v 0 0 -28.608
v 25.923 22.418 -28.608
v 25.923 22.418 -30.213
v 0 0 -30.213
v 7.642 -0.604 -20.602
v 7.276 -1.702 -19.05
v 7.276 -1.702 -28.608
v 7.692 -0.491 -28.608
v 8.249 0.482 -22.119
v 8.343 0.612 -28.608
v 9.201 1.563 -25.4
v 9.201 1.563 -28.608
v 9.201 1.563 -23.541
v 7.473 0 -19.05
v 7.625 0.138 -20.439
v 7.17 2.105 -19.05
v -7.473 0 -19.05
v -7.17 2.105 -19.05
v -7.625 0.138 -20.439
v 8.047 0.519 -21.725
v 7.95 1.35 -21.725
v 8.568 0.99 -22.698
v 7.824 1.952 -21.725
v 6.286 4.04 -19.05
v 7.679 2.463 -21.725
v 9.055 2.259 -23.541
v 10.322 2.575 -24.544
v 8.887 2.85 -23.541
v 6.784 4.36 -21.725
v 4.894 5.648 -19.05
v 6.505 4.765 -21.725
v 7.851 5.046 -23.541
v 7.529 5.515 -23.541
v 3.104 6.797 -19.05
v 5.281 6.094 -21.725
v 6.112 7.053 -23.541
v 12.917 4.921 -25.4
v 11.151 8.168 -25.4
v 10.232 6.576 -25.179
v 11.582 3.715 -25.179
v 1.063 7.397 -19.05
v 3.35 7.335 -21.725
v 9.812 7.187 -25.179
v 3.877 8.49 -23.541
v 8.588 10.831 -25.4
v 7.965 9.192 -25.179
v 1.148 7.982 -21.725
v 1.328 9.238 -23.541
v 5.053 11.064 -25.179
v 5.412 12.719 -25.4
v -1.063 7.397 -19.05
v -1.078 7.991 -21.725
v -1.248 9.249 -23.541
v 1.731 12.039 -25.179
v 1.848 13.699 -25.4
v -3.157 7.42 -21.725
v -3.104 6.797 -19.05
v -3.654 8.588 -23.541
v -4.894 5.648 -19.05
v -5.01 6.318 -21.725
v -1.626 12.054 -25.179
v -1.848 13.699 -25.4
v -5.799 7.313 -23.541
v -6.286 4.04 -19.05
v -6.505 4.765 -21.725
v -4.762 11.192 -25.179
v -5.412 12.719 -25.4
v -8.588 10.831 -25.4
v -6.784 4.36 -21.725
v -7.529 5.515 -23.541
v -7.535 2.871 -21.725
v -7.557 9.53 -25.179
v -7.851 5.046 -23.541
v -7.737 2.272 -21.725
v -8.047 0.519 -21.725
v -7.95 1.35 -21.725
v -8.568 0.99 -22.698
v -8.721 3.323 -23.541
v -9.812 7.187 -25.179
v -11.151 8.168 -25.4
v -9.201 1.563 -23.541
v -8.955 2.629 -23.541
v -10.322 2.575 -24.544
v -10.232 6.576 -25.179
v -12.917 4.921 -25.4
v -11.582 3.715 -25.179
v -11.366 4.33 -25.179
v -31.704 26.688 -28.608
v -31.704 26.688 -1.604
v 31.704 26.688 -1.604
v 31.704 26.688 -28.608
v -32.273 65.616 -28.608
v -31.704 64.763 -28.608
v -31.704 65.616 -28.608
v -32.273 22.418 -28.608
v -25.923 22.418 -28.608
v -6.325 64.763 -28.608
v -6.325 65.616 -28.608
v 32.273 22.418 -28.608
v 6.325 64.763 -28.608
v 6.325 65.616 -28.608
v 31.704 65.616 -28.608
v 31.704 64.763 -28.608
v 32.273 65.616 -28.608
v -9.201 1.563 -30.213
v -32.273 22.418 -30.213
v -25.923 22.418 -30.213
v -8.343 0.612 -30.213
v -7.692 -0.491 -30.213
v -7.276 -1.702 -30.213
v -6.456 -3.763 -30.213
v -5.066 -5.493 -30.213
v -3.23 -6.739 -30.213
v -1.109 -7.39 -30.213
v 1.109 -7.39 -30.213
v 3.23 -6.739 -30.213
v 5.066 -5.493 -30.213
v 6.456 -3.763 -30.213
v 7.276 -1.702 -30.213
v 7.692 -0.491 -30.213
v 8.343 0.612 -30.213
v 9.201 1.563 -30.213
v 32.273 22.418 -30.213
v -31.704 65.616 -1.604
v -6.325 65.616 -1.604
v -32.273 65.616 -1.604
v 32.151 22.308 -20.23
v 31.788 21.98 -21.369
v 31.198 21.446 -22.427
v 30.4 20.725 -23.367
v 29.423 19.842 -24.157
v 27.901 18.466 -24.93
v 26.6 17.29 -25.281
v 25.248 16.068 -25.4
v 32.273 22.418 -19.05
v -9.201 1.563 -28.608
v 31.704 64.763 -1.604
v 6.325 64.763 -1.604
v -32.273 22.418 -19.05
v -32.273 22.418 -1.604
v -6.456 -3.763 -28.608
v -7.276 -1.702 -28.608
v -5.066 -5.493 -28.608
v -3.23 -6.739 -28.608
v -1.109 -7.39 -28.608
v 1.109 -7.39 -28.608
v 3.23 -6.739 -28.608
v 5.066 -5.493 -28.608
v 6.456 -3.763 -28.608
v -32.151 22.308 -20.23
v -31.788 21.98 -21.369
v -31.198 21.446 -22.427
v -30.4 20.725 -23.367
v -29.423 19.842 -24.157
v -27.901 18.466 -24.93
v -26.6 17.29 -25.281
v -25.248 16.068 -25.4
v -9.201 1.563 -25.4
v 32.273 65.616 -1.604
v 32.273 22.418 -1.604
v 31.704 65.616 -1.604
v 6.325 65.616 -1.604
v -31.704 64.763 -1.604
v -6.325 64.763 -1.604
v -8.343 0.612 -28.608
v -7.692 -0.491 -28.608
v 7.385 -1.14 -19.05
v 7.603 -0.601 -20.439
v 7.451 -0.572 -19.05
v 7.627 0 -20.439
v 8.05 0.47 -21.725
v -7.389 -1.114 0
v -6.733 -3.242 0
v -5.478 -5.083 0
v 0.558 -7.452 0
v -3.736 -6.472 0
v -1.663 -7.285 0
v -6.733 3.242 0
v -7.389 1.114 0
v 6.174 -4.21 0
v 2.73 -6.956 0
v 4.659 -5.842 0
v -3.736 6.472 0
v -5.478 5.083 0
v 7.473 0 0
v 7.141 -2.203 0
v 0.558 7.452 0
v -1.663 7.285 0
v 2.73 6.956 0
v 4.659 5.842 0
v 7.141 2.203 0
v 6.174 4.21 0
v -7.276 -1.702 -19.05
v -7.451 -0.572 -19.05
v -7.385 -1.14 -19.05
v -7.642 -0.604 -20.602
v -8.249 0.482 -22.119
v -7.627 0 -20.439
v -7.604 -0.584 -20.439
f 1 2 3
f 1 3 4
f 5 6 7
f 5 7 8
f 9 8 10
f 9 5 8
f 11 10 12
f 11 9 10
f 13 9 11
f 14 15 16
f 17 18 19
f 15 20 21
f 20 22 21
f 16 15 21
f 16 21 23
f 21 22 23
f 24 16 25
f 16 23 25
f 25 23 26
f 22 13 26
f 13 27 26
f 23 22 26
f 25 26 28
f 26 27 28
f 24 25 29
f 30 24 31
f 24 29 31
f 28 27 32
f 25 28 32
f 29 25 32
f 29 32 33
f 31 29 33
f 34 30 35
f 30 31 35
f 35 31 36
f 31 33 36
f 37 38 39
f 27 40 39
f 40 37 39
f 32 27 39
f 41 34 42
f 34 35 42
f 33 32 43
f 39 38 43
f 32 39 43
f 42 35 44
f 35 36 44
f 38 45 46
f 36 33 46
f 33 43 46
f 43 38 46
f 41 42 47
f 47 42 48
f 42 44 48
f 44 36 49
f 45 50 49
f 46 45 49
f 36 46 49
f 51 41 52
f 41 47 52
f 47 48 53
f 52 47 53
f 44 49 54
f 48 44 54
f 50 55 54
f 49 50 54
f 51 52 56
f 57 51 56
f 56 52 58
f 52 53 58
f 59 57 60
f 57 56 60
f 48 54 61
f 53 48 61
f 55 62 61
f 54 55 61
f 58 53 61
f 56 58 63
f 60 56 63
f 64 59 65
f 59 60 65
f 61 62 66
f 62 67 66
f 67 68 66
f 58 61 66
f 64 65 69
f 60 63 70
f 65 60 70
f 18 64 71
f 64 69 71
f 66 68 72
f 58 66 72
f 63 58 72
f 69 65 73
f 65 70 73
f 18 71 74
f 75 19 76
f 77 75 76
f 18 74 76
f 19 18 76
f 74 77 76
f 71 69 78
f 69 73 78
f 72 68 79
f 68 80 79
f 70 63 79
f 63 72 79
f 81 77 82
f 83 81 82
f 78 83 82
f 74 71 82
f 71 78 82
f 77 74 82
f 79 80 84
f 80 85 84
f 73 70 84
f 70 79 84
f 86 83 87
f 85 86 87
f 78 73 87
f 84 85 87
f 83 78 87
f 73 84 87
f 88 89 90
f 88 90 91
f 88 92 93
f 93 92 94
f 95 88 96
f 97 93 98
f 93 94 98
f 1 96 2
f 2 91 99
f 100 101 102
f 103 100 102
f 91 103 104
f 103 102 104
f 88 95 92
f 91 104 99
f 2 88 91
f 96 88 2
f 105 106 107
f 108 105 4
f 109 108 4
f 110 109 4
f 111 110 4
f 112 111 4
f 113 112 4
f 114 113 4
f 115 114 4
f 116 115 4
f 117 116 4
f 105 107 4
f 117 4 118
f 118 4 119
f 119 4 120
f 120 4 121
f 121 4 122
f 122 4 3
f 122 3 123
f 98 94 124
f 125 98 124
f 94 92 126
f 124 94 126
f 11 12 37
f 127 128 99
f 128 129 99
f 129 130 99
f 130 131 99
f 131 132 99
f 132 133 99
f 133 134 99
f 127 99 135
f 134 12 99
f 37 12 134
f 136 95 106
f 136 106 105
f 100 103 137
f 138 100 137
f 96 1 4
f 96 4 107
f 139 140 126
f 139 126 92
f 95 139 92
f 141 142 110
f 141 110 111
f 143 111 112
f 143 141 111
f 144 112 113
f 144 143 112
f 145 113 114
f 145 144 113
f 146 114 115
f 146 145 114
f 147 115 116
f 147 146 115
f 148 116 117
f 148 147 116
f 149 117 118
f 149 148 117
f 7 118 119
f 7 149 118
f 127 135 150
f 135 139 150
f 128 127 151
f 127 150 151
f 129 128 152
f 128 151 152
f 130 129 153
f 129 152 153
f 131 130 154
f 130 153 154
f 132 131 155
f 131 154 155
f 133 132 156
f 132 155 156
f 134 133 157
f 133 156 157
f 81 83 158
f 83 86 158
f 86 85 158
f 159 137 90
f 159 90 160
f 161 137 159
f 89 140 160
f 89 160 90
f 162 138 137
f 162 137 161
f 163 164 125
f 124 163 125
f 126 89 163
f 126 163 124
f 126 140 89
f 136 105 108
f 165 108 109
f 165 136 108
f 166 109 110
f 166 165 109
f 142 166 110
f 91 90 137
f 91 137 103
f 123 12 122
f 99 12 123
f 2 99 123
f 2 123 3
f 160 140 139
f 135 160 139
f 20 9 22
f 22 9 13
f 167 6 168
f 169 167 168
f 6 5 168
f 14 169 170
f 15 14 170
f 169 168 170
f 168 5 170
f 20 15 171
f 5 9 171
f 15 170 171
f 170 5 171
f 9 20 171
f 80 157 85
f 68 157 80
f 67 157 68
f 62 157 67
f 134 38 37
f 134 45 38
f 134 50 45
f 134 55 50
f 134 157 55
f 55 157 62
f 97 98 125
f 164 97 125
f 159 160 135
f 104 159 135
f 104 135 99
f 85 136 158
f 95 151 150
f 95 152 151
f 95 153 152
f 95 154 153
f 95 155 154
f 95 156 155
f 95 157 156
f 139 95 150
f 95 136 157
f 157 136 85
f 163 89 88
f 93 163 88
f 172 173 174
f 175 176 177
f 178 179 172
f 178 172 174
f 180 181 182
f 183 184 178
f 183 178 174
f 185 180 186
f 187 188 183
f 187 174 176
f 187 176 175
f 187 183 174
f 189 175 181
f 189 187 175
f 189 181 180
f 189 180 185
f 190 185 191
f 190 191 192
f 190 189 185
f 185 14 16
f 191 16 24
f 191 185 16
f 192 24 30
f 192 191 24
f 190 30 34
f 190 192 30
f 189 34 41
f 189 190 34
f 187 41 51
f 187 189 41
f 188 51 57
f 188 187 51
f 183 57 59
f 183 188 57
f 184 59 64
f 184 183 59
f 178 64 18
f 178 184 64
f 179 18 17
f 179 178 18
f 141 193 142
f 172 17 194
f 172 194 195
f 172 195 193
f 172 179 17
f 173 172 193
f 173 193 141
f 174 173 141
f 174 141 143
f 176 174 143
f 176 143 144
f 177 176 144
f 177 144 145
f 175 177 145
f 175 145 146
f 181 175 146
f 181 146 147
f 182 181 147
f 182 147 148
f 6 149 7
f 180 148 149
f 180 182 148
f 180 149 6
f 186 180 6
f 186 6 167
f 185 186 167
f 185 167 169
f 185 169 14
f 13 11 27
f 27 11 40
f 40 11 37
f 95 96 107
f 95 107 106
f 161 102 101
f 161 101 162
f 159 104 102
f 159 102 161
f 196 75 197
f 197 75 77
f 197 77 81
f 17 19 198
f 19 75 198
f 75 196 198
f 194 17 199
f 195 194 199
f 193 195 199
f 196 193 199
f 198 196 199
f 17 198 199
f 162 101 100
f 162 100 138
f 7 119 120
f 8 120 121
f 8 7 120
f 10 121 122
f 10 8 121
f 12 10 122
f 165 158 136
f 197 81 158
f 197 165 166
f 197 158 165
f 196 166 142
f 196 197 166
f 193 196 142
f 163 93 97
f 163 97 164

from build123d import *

# Parameters (mm, degrees)
SKETCH1_R           = 7.472749452
BOSS_EXTRUDE1_DEPTH = 25.4
SKETCH2_W           = 14.945498904
SKETCH2_H           = 22.418248356
BOSS_EXTRUDE2_DEPTH = 3.20842108
SKETCH4_W           = 63.40856
SKETCH4_H           = 4.26981756
BOSS_EXTRUDE3_DEPTH = 27.00421054
SKETCH6_W           = 27.00421054
SKETCH6_H           = 4.26981756
BOSS_EXTRUDE4_DEPTH = 0.56888896
SKETCH7_W           = 0.56888896
SKETCH7_H           = 27.00421054
BOSS_EXTRUDE5_DEPTH = 38.0746
SKETCH8_W           = 0.56888896
SKETCH8_H           = 27.00421054
BOSS_EXTRUDE6_DEPTH = 0.853447309
SKETCH9_W           = 27.00421054
SKETCH9_H           = 0.853447309
BOSS_EXTRUDE7_DEPTH = 25.37968
BOSS_EXTRUDE8_DEPTH = 3.20842108
FILLET4_R           = 6.35
FILLET5_R           = 6.35
BOSS_EXTRUDE9_DEPTH = 1.60421054


with BuildPart() as part:
    # Sketch1 → Boss-Extrude1 (new body)
    with BuildSketch(Plane.XY):
        Circle(SKETCH1_R)
    extrude(amount=-BOSS_EXTRUDE1_DEPTH)

    # Sketch2 → Boss-Extrude2 (add)
    with BuildSketch(Plane(origin=(0, 0, -25.4), x_dir=(-1, 0, 0), z_dir=(0, 0, -1))):
        with BuildLine():
            ThreePointArc((7.472749452, 0), (0, 7.472749452), (-7.472749452, 0))
            Line((-7.472749452, 0), (7.472749452, 0))
        make_face()
        with BuildLine():
            Line((7.472749452, 0), (-7.472749452, 0))
            ThreePointArc((-7.472749452, 0), (0, -7.472749452), (7.472749452, 0))
        make_face()
        with BuildLine():
            ThreePointArc((7.472749452, 0), (0, 7.472749452), (-7.472749452, 0))
            Line((-7.472749452, 0), (7.472749452, 0))
        make_face()
        with BuildLine():
            Line((7.472749452, 0), (-7.472749452, 0))
            ThreePointArc((-7.472749452, 0), (0, -7.472749452), (7.472749452, 0))
        make_face()
        with Locations((0, 11.209124178)):
            Rectangle(SKETCH2_W, SKETCH2_H)
    extrude(amount=BOSS_EXTRUDE2_DEPTH)

    # Sketch4 → Boss-Extrude3 (add)
    with BuildSketch(Plane(origin=(0, 0, -28.60842108), x_dir=(-1, 0, 0), z_dir=(0, 0, -1))):
        with Locations((0, 24.553157136)):
            Rectangle(SKETCH4_W, SKETCH4_H)
    extrude(amount=-BOSS_EXTRUDE3_DEPTH)

    # Sketch6 → Boss-Extrude4 (add)
    with BuildSketch(Plane(origin=(31.70428, 0, 0), x_dir=(0, 0, -1), z_dir=(1, 0, 0))):
        with Locations((15.10631581, 24.553157136)):
            Rectangle(SKETCH6_W, SKETCH6_H)
    boss_extrude4 = extrude(amount=BOSS_EXTRUDE4_DEPTH)

    # Sketch7 → Boss-Extrude5 (add)
    with BuildSketch(Plane(origin=(0, 26.688065916, 0), x_dir=(1, 0, 0), z_dir=(0, 1, 0))):
        with Locations((31.98872448, 15.10631581)):
            Rectangle(SKETCH7_W, SKETCH7_H)
    boss_extrude5 = extrude(amount=BOSS_EXTRUDE5_DEPTH)

    # Sketch8 → Boss-Extrude6 (add)
    with BuildSketch(Plane(origin=(0, 64.762665916, 0), x_dir=(1, 0, 0), z_dir=(0, 1, 0))):
        with Locations((31.98872448, 15.10631581)):
            Rectangle(SKETCH8_W, SKETCH8_H)
    boss_extrude6 = extrude(amount=BOSS_EXTRUDE6_DEPTH)

    # Sketch9 → Boss-Extrude7 (add)
    with BuildSketch(Plane.ZY.offset(-31.70428)):
        with Locations((-15.10631581, 65.18938957)):
            Rectangle(SKETCH9_W, SKETCH9_H)
    boss_extrude7 = extrude(amount=BOSS_EXTRUDE7_DEPTH)

    # Mirror1: Boss-Extrude4, Boss-Extrude5, Boss-Extrude6, Boss-Extrude7 across plane
    add(boss_extrude4.mirror(Plane(origin=(0, 0, 0), x_dir=(0, 0, 1), z_dir=(1, 0, 0))))
    add(boss_extrude5.mirror(Plane(origin=(0, 0, 0), x_dir=(0, 0, 1), z_dir=(1, 0, 0))))
    add(boss_extrude6.mirror(Plane(origin=(0, 0, 0), x_dir=(0, 0, 1), z_dir=(1, 0, 0))))
    add(boss_extrude7.mirror(Plane(origin=(0, 0, 0), x_dir=(0, 0, 1), z_dir=(1, 0, 0))))

    # Sketch13 → Boss-Extrude8 (add)
    with BuildSketch(Plane(origin=(0, 0, -28.60842108), x_dir=(-1, 0, 0), z_dir=(0, 0, -1))):
        Polygon((-7.472749452, 0), (-32.27316896, 22.418248356), (-7.472749452, 22.418248356), align=None)
        Polygon((7.472749452, 0), (32.27316896, 22.418248356), (7.472749452, 22.418248356), align=None)
    extrude(amount=-BOSS_EXTRUDE8_DEPTH)

    # Fillet4
    fillet4_edges = [part.edges().sort_by_distance(p)[0] for p in [
        (0, 22.418248356, -25.4),
    ]]
    fillet(fillet4_edges, radius=FILLET4_R)

    # Fillet5
    # the kernel refuses this fillet: 6.35 mm, written as the material it adds along each edge
    with BuildSketch(Plane(origin=(0, 0, -25.4), x_dir=(0.003141587485879873, -0.9999950652018582, 0), z_dir=(-0.9999950652018582, -0.003141587485879873, 0))) as fillet5_piece_1_section:
        with BuildLine():
            CenterArc((7.472749452 + FILLET5_R, FILLET5_R), FILLET5_R, 180, 90)
            Line((7.472749452 + FILLET5_R, 0), (7.472749452 + FILLET5_R, -FILLET5_R * 0.02))
            Line((7.472749452 + FILLET5_R, -FILLET5_R * 0.02), (7.472749452 - FILLET5_R * 0.02, -FILLET5_R * 0.02))
            Line((7.472749452 - FILLET5_R * 0.02, -FILLET5_R * 0.02), (7.472749452 - FILLET5_R * 0.02, FILLET5_R))
            Line((7.472749452 - FILLET5_R * 0.02, FILLET5_R), (7.472749452, FILLET5_R))
        make_face()
    fillet5_piece_1 = revolve(axis=Axis((0, 0, -25.4), (0, 0, 1)), revolution_arc=359.64, mode=Mode.PRIVATE)
    fillet5_piece_1 = split(fillet5_piece_1, bisect_by=Plane(origin=(-7.980408712, 0.458896729, -23.585442905), z_dir=(0.6705805717075095, 0.7418367049751783, 0)), keep=Keep.TOP, mode=Mode.PRIVATE)
    fillet5_piece_1 = split(fillet5_piece_1, bisect_by=Plane(origin=(7.980408712, 0.458896729, -23.585442905), z_dir=(-0.6705805717075095, 0.7418367049751783, 0)), keep=Keep.TOP, mode=Mode.PRIVATE)
    add(fillet5_piece_1)
    with BuildSketch(Plane(origin=(7.472749452, 0, -25.4), x_dir=(-0.11463149337271429, -0.9934080836832069, 0), z_dir=(0, 0, -1))) as fillet5_piece_2:
        with BuildLine():
            CenterArc((2.441134842, -6.308141331), FILLET5_R, 96.582370614, 34.723369341)
            Line((-1.750353646, -1.538033968), (-1.834183416, -1.44263182))
            Line((-1.834183416, -1.44263182), (-0.08382977, 0.095402147))
            Line((-0.08382977, 0.095402147), (0.0145582, 0.126162827))
            ThreePointArc((0.0145582, 0.126162827), (0.856612429, 0.077740261), (1.698666659, 0.126162827))
            Line((1.698666659, 0.126162827), (1.713224859, 0))
        make_face()
    extrude(amount=3.20842108)
    with BuildSketch(Plane(origin=(-7.472749452, 0, -25.4), x_dir=(-0.7418367049751787, 0.6705805717075091, 0), z_dir=(0, 0, -1))) as fillet5_piece_3:
        with BuildLine():
            CenterArc((2.330082911, -6.35), FILLET5_R, 90, 34.723369341)
            Line((-1.286971105, -1.1308602), (-1.359312185, -1.026477404))
            ThreePointArc((-1.359312185, -1.026477404), (-0.694800105, -0.507031771), (-0.094213262, 0.085163733))
            Line((-0.094213262, 0.085163733), (0, 0.127))
            Line((0, 0.127), (2.330082911, 0.127))
            Line((2.330082911, 0.127), (2.330082911, 0))
        make_face()
    extrude(amount=3.20842108)
    with BuildSketch(Plane(origin=(7.472749452, 0, -11.419502535), x_dir=(-0.11463149337271447, -0.9934080836832069, 0), z_dir=(0, 0, -1))) as fillet5_piece_4a_section:
        with BuildLine():
            CenterArc((2.441134842, -6.308141331), FILLET5_R, 96.582370614, 34.723369341)
            Line((-1.750353646, -1.538033968), (-1.834183416, -1.44263182))
            Line((-1.834183416, -1.44263182), (-0.08382977, 0.095402147))
            Line((-0.08382977, 0.095402147), (0.0145582, 0.126162827))
            ThreePointArc((0.0145582, 0.126162827), (0.856612429, 0.077740261), (1.698666659, 0.126162827))
            Line((1.698666659, 0.126162827), (1.713224859, 0))
        make_face()
    fillet5_piece_4a = extrude(amount=17.188918545, mode=Mode.PRIVATE)
    fillet5_piece_4a = split(fillet5_piece_4a, bisect_by=Plane(origin=(7.858473842, 0.054386522, -25.4), z_dir=(0, 0, 1)), keep=Keep.TOP, mode=Mode.PRIVATE)
    with BuildSketch(Plane(origin=(0, 0, -25.4), x_dir=(0.003141587485879873, -0.9999950652018582, 0), z_dir=(-0.9999950652018582, -0.003141587485879873, 0))) as fillet5_piece_4b_section:
        with BuildLine():
            CenterArc((7.472749452 + FILLET5_R, FILLET5_R), FILLET5_R, 180, 90)
            Line((7.472749452 + FILLET5_R, 0), (7.472749452 + FILLET5_R, -FILLET5_R * 0.02))
            Line((7.472749452 + FILLET5_R, -FILLET5_R * 0.02), (7.472749452 - FILLET5_R * 0.02, -FILLET5_R * 0.02))
            Line((7.472749452 - FILLET5_R * 0.02, -FILLET5_R * 0.02), (7.472749452 - FILLET5_R * 0.02, FILLET5_R))
            Line((7.472749452 - FILLET5_R * 0.02, FILLET5_R), (7.472749452, FILLET5_R))
        make_face()
    fillet5_piece_4b = revolve(axis=Axis((0, 0, -25.4), (0, 0, 1)), revolution_arc=359.64, mode=Mode.PRIVATE)
    fillet5_piece_4b = split(fillet5_piece_4b, bisect_by=Plane(origin=(2.712448107, -9.20687202, -24.086642783), z_dir=(0.6705805717075095, 0.7418367049751783, 0)), keep=Keep.TOP, mode=Mode.PRIVATE)
    fillet5_piece_4b = split(fillet5_piece_4b, bisect_by=Plane(origin=(4.884392341, -2.339735928, -24.086642783), z_dir=(0.6705805717075095, -0.7418367049751783, 0)), keep=Keep.TOP, mode=Mode.PRIVATE)
    fillet5_piece_4 = fillet5_piece_4a & fillet5_piece_4b
    add(fillet5_piece_4)
    with BuildSketch(Plane(origin=(-7.472749452, 0, -11.419502535), x_dir=(-0.7418367049751784, 0.6705805717075094, 0), z_dir=(0, 0, -1))) as fillet5_piece_5a_section:
        with BuildLine():
            CenterArc((2.330082911, -6.35), FILLET5_R, 90, 34.723369341)
            Line((-1.286971105, -1.1308602), (-1.359312185, -1.026477404))
            ThreePointArc((-1.359312185, -1.026477404), (-0.694800105, -0.507031771), (-0.094213262, 0.085163733))
            Line((-0.094213262, 0.085163733), (0, 0.127))
            Line((0, 0.127), (2.330082911, 0.127))
            Line((2.330082911, 0.127), (2.330082911, 0))
        make_face()
    fillet5_piece_5a = extrude(amount=17.188918545, mode=Mode.PRIVATE)
    fillet5_piece_5a = split(fillet5_piece_5a, bisect_by=Plane(origin=(-7.858473842, 0.054386522, -25.4), z_dir=(0, 0, 1)), keep=Keep.TOP, mode=Mode.PRIVATE)
    with BuildSketch(Plane(origin=(0, 0, -25.4), x_dir=(0.003141587485879873, -0.9999950652018582, 0), z_dir=(-0.9999950652018582, -0.003141587485879873, 0))) as fillet5_piece_5b_section:
        with BuildLine():
            CenterArc((7.472749452 + FILLET5_R, FILLET5_R), FILLET5_R, 180, 90)
            Line((7.472749452 + FILLET5_R, 0), (7.472749452 + FILLET5_R, -FILLET5_R * 0.02))
            Line((7.472749452 + FILLET5_R, -FILLET5_R * 0.02), (7.472749452 - FILLET5_R * 0.02, -FILLET5_R * 0.02))
            Line((7.472749452 - FILLET5_R * 0.02, -FILLET5_R * 0.02), (7.472749452 - FILLET5_R * 0.02, FILLET5_R))
            Line((7.472749452 - FILLET5_R * 0.02, FILLET5_R), (7.472749452, FILLET5_R))
        make_face()
    fillet5_piece_5b = revolve(axis=Axis((0, 0, -25.4), (0, 0, 1)), revolution_arc=359.64, mode=Mode.PRIVATE)
    fillet5_piece_5b = split(fillet5_piece_5b, bisect_by=Plane(origin=(-4.884392341, -2.339735928, -24.086642783), z_dir=(-0.6705805717075095, -0.7418367049751783, 0)), keep=Keep.TOP, mode=Mode.PRIVATE)
    fillet5_piece_5b = split(fillet5_piece_5b, bisect_by=Plane(origin=(-2.712448107, -9.20687202, -24.086642783), z_dir=(-0.6705805717075095, 0.7418367049751783, 0)), keep=Keep.TOP, mode=Mode.PRIVATE)
    fillet5_piece_5 = fillet5_piece_5a & fillet5_piece_5b
    add(fillet5_piece_5)

    # Sketch14 → Boss-Extrude9 (add)
    with BuildSketch(Plane(origin=(0, 0, -28.60842108), x_dir=(-1, 0, 0), z_dir=(0, 0, -1))):
        with BuildLine():
            Line((-32.27316896, 22.418248356), (-25.92316896, 22.418248356))
            Line((-25.92316896, 22.418248356), (0, 0))
            Line((0, 0), (25.92316896, 22.418248356))
            Line((25.92316896, 22.418248356), (32.27316896, 22.418248356))
            Line((32.27316896, 22.418248356), (9.201290481, 1.56250833))
            ThreePointArc((9.201290481, 1.56250833), (7.989618973, 0.077237004), (7.276359928, -1.701931424))
            ThreePointArc((7.276359928, -1.701931424), (0, -7.472749452), (-7.276359928, -1.701931424))
            ThreePointArc((-7.276359928, -1.701931424), (-7.989618973, 0.077237004), (-9.201290481, 1.56250833))
            Line((-9.201290481, 1.56250833), (-32.27316896, 22.418248356))
        make_face()
    extrude(amount=BOSS_EXTRUDE9_DEPTH)


solid = part.part
